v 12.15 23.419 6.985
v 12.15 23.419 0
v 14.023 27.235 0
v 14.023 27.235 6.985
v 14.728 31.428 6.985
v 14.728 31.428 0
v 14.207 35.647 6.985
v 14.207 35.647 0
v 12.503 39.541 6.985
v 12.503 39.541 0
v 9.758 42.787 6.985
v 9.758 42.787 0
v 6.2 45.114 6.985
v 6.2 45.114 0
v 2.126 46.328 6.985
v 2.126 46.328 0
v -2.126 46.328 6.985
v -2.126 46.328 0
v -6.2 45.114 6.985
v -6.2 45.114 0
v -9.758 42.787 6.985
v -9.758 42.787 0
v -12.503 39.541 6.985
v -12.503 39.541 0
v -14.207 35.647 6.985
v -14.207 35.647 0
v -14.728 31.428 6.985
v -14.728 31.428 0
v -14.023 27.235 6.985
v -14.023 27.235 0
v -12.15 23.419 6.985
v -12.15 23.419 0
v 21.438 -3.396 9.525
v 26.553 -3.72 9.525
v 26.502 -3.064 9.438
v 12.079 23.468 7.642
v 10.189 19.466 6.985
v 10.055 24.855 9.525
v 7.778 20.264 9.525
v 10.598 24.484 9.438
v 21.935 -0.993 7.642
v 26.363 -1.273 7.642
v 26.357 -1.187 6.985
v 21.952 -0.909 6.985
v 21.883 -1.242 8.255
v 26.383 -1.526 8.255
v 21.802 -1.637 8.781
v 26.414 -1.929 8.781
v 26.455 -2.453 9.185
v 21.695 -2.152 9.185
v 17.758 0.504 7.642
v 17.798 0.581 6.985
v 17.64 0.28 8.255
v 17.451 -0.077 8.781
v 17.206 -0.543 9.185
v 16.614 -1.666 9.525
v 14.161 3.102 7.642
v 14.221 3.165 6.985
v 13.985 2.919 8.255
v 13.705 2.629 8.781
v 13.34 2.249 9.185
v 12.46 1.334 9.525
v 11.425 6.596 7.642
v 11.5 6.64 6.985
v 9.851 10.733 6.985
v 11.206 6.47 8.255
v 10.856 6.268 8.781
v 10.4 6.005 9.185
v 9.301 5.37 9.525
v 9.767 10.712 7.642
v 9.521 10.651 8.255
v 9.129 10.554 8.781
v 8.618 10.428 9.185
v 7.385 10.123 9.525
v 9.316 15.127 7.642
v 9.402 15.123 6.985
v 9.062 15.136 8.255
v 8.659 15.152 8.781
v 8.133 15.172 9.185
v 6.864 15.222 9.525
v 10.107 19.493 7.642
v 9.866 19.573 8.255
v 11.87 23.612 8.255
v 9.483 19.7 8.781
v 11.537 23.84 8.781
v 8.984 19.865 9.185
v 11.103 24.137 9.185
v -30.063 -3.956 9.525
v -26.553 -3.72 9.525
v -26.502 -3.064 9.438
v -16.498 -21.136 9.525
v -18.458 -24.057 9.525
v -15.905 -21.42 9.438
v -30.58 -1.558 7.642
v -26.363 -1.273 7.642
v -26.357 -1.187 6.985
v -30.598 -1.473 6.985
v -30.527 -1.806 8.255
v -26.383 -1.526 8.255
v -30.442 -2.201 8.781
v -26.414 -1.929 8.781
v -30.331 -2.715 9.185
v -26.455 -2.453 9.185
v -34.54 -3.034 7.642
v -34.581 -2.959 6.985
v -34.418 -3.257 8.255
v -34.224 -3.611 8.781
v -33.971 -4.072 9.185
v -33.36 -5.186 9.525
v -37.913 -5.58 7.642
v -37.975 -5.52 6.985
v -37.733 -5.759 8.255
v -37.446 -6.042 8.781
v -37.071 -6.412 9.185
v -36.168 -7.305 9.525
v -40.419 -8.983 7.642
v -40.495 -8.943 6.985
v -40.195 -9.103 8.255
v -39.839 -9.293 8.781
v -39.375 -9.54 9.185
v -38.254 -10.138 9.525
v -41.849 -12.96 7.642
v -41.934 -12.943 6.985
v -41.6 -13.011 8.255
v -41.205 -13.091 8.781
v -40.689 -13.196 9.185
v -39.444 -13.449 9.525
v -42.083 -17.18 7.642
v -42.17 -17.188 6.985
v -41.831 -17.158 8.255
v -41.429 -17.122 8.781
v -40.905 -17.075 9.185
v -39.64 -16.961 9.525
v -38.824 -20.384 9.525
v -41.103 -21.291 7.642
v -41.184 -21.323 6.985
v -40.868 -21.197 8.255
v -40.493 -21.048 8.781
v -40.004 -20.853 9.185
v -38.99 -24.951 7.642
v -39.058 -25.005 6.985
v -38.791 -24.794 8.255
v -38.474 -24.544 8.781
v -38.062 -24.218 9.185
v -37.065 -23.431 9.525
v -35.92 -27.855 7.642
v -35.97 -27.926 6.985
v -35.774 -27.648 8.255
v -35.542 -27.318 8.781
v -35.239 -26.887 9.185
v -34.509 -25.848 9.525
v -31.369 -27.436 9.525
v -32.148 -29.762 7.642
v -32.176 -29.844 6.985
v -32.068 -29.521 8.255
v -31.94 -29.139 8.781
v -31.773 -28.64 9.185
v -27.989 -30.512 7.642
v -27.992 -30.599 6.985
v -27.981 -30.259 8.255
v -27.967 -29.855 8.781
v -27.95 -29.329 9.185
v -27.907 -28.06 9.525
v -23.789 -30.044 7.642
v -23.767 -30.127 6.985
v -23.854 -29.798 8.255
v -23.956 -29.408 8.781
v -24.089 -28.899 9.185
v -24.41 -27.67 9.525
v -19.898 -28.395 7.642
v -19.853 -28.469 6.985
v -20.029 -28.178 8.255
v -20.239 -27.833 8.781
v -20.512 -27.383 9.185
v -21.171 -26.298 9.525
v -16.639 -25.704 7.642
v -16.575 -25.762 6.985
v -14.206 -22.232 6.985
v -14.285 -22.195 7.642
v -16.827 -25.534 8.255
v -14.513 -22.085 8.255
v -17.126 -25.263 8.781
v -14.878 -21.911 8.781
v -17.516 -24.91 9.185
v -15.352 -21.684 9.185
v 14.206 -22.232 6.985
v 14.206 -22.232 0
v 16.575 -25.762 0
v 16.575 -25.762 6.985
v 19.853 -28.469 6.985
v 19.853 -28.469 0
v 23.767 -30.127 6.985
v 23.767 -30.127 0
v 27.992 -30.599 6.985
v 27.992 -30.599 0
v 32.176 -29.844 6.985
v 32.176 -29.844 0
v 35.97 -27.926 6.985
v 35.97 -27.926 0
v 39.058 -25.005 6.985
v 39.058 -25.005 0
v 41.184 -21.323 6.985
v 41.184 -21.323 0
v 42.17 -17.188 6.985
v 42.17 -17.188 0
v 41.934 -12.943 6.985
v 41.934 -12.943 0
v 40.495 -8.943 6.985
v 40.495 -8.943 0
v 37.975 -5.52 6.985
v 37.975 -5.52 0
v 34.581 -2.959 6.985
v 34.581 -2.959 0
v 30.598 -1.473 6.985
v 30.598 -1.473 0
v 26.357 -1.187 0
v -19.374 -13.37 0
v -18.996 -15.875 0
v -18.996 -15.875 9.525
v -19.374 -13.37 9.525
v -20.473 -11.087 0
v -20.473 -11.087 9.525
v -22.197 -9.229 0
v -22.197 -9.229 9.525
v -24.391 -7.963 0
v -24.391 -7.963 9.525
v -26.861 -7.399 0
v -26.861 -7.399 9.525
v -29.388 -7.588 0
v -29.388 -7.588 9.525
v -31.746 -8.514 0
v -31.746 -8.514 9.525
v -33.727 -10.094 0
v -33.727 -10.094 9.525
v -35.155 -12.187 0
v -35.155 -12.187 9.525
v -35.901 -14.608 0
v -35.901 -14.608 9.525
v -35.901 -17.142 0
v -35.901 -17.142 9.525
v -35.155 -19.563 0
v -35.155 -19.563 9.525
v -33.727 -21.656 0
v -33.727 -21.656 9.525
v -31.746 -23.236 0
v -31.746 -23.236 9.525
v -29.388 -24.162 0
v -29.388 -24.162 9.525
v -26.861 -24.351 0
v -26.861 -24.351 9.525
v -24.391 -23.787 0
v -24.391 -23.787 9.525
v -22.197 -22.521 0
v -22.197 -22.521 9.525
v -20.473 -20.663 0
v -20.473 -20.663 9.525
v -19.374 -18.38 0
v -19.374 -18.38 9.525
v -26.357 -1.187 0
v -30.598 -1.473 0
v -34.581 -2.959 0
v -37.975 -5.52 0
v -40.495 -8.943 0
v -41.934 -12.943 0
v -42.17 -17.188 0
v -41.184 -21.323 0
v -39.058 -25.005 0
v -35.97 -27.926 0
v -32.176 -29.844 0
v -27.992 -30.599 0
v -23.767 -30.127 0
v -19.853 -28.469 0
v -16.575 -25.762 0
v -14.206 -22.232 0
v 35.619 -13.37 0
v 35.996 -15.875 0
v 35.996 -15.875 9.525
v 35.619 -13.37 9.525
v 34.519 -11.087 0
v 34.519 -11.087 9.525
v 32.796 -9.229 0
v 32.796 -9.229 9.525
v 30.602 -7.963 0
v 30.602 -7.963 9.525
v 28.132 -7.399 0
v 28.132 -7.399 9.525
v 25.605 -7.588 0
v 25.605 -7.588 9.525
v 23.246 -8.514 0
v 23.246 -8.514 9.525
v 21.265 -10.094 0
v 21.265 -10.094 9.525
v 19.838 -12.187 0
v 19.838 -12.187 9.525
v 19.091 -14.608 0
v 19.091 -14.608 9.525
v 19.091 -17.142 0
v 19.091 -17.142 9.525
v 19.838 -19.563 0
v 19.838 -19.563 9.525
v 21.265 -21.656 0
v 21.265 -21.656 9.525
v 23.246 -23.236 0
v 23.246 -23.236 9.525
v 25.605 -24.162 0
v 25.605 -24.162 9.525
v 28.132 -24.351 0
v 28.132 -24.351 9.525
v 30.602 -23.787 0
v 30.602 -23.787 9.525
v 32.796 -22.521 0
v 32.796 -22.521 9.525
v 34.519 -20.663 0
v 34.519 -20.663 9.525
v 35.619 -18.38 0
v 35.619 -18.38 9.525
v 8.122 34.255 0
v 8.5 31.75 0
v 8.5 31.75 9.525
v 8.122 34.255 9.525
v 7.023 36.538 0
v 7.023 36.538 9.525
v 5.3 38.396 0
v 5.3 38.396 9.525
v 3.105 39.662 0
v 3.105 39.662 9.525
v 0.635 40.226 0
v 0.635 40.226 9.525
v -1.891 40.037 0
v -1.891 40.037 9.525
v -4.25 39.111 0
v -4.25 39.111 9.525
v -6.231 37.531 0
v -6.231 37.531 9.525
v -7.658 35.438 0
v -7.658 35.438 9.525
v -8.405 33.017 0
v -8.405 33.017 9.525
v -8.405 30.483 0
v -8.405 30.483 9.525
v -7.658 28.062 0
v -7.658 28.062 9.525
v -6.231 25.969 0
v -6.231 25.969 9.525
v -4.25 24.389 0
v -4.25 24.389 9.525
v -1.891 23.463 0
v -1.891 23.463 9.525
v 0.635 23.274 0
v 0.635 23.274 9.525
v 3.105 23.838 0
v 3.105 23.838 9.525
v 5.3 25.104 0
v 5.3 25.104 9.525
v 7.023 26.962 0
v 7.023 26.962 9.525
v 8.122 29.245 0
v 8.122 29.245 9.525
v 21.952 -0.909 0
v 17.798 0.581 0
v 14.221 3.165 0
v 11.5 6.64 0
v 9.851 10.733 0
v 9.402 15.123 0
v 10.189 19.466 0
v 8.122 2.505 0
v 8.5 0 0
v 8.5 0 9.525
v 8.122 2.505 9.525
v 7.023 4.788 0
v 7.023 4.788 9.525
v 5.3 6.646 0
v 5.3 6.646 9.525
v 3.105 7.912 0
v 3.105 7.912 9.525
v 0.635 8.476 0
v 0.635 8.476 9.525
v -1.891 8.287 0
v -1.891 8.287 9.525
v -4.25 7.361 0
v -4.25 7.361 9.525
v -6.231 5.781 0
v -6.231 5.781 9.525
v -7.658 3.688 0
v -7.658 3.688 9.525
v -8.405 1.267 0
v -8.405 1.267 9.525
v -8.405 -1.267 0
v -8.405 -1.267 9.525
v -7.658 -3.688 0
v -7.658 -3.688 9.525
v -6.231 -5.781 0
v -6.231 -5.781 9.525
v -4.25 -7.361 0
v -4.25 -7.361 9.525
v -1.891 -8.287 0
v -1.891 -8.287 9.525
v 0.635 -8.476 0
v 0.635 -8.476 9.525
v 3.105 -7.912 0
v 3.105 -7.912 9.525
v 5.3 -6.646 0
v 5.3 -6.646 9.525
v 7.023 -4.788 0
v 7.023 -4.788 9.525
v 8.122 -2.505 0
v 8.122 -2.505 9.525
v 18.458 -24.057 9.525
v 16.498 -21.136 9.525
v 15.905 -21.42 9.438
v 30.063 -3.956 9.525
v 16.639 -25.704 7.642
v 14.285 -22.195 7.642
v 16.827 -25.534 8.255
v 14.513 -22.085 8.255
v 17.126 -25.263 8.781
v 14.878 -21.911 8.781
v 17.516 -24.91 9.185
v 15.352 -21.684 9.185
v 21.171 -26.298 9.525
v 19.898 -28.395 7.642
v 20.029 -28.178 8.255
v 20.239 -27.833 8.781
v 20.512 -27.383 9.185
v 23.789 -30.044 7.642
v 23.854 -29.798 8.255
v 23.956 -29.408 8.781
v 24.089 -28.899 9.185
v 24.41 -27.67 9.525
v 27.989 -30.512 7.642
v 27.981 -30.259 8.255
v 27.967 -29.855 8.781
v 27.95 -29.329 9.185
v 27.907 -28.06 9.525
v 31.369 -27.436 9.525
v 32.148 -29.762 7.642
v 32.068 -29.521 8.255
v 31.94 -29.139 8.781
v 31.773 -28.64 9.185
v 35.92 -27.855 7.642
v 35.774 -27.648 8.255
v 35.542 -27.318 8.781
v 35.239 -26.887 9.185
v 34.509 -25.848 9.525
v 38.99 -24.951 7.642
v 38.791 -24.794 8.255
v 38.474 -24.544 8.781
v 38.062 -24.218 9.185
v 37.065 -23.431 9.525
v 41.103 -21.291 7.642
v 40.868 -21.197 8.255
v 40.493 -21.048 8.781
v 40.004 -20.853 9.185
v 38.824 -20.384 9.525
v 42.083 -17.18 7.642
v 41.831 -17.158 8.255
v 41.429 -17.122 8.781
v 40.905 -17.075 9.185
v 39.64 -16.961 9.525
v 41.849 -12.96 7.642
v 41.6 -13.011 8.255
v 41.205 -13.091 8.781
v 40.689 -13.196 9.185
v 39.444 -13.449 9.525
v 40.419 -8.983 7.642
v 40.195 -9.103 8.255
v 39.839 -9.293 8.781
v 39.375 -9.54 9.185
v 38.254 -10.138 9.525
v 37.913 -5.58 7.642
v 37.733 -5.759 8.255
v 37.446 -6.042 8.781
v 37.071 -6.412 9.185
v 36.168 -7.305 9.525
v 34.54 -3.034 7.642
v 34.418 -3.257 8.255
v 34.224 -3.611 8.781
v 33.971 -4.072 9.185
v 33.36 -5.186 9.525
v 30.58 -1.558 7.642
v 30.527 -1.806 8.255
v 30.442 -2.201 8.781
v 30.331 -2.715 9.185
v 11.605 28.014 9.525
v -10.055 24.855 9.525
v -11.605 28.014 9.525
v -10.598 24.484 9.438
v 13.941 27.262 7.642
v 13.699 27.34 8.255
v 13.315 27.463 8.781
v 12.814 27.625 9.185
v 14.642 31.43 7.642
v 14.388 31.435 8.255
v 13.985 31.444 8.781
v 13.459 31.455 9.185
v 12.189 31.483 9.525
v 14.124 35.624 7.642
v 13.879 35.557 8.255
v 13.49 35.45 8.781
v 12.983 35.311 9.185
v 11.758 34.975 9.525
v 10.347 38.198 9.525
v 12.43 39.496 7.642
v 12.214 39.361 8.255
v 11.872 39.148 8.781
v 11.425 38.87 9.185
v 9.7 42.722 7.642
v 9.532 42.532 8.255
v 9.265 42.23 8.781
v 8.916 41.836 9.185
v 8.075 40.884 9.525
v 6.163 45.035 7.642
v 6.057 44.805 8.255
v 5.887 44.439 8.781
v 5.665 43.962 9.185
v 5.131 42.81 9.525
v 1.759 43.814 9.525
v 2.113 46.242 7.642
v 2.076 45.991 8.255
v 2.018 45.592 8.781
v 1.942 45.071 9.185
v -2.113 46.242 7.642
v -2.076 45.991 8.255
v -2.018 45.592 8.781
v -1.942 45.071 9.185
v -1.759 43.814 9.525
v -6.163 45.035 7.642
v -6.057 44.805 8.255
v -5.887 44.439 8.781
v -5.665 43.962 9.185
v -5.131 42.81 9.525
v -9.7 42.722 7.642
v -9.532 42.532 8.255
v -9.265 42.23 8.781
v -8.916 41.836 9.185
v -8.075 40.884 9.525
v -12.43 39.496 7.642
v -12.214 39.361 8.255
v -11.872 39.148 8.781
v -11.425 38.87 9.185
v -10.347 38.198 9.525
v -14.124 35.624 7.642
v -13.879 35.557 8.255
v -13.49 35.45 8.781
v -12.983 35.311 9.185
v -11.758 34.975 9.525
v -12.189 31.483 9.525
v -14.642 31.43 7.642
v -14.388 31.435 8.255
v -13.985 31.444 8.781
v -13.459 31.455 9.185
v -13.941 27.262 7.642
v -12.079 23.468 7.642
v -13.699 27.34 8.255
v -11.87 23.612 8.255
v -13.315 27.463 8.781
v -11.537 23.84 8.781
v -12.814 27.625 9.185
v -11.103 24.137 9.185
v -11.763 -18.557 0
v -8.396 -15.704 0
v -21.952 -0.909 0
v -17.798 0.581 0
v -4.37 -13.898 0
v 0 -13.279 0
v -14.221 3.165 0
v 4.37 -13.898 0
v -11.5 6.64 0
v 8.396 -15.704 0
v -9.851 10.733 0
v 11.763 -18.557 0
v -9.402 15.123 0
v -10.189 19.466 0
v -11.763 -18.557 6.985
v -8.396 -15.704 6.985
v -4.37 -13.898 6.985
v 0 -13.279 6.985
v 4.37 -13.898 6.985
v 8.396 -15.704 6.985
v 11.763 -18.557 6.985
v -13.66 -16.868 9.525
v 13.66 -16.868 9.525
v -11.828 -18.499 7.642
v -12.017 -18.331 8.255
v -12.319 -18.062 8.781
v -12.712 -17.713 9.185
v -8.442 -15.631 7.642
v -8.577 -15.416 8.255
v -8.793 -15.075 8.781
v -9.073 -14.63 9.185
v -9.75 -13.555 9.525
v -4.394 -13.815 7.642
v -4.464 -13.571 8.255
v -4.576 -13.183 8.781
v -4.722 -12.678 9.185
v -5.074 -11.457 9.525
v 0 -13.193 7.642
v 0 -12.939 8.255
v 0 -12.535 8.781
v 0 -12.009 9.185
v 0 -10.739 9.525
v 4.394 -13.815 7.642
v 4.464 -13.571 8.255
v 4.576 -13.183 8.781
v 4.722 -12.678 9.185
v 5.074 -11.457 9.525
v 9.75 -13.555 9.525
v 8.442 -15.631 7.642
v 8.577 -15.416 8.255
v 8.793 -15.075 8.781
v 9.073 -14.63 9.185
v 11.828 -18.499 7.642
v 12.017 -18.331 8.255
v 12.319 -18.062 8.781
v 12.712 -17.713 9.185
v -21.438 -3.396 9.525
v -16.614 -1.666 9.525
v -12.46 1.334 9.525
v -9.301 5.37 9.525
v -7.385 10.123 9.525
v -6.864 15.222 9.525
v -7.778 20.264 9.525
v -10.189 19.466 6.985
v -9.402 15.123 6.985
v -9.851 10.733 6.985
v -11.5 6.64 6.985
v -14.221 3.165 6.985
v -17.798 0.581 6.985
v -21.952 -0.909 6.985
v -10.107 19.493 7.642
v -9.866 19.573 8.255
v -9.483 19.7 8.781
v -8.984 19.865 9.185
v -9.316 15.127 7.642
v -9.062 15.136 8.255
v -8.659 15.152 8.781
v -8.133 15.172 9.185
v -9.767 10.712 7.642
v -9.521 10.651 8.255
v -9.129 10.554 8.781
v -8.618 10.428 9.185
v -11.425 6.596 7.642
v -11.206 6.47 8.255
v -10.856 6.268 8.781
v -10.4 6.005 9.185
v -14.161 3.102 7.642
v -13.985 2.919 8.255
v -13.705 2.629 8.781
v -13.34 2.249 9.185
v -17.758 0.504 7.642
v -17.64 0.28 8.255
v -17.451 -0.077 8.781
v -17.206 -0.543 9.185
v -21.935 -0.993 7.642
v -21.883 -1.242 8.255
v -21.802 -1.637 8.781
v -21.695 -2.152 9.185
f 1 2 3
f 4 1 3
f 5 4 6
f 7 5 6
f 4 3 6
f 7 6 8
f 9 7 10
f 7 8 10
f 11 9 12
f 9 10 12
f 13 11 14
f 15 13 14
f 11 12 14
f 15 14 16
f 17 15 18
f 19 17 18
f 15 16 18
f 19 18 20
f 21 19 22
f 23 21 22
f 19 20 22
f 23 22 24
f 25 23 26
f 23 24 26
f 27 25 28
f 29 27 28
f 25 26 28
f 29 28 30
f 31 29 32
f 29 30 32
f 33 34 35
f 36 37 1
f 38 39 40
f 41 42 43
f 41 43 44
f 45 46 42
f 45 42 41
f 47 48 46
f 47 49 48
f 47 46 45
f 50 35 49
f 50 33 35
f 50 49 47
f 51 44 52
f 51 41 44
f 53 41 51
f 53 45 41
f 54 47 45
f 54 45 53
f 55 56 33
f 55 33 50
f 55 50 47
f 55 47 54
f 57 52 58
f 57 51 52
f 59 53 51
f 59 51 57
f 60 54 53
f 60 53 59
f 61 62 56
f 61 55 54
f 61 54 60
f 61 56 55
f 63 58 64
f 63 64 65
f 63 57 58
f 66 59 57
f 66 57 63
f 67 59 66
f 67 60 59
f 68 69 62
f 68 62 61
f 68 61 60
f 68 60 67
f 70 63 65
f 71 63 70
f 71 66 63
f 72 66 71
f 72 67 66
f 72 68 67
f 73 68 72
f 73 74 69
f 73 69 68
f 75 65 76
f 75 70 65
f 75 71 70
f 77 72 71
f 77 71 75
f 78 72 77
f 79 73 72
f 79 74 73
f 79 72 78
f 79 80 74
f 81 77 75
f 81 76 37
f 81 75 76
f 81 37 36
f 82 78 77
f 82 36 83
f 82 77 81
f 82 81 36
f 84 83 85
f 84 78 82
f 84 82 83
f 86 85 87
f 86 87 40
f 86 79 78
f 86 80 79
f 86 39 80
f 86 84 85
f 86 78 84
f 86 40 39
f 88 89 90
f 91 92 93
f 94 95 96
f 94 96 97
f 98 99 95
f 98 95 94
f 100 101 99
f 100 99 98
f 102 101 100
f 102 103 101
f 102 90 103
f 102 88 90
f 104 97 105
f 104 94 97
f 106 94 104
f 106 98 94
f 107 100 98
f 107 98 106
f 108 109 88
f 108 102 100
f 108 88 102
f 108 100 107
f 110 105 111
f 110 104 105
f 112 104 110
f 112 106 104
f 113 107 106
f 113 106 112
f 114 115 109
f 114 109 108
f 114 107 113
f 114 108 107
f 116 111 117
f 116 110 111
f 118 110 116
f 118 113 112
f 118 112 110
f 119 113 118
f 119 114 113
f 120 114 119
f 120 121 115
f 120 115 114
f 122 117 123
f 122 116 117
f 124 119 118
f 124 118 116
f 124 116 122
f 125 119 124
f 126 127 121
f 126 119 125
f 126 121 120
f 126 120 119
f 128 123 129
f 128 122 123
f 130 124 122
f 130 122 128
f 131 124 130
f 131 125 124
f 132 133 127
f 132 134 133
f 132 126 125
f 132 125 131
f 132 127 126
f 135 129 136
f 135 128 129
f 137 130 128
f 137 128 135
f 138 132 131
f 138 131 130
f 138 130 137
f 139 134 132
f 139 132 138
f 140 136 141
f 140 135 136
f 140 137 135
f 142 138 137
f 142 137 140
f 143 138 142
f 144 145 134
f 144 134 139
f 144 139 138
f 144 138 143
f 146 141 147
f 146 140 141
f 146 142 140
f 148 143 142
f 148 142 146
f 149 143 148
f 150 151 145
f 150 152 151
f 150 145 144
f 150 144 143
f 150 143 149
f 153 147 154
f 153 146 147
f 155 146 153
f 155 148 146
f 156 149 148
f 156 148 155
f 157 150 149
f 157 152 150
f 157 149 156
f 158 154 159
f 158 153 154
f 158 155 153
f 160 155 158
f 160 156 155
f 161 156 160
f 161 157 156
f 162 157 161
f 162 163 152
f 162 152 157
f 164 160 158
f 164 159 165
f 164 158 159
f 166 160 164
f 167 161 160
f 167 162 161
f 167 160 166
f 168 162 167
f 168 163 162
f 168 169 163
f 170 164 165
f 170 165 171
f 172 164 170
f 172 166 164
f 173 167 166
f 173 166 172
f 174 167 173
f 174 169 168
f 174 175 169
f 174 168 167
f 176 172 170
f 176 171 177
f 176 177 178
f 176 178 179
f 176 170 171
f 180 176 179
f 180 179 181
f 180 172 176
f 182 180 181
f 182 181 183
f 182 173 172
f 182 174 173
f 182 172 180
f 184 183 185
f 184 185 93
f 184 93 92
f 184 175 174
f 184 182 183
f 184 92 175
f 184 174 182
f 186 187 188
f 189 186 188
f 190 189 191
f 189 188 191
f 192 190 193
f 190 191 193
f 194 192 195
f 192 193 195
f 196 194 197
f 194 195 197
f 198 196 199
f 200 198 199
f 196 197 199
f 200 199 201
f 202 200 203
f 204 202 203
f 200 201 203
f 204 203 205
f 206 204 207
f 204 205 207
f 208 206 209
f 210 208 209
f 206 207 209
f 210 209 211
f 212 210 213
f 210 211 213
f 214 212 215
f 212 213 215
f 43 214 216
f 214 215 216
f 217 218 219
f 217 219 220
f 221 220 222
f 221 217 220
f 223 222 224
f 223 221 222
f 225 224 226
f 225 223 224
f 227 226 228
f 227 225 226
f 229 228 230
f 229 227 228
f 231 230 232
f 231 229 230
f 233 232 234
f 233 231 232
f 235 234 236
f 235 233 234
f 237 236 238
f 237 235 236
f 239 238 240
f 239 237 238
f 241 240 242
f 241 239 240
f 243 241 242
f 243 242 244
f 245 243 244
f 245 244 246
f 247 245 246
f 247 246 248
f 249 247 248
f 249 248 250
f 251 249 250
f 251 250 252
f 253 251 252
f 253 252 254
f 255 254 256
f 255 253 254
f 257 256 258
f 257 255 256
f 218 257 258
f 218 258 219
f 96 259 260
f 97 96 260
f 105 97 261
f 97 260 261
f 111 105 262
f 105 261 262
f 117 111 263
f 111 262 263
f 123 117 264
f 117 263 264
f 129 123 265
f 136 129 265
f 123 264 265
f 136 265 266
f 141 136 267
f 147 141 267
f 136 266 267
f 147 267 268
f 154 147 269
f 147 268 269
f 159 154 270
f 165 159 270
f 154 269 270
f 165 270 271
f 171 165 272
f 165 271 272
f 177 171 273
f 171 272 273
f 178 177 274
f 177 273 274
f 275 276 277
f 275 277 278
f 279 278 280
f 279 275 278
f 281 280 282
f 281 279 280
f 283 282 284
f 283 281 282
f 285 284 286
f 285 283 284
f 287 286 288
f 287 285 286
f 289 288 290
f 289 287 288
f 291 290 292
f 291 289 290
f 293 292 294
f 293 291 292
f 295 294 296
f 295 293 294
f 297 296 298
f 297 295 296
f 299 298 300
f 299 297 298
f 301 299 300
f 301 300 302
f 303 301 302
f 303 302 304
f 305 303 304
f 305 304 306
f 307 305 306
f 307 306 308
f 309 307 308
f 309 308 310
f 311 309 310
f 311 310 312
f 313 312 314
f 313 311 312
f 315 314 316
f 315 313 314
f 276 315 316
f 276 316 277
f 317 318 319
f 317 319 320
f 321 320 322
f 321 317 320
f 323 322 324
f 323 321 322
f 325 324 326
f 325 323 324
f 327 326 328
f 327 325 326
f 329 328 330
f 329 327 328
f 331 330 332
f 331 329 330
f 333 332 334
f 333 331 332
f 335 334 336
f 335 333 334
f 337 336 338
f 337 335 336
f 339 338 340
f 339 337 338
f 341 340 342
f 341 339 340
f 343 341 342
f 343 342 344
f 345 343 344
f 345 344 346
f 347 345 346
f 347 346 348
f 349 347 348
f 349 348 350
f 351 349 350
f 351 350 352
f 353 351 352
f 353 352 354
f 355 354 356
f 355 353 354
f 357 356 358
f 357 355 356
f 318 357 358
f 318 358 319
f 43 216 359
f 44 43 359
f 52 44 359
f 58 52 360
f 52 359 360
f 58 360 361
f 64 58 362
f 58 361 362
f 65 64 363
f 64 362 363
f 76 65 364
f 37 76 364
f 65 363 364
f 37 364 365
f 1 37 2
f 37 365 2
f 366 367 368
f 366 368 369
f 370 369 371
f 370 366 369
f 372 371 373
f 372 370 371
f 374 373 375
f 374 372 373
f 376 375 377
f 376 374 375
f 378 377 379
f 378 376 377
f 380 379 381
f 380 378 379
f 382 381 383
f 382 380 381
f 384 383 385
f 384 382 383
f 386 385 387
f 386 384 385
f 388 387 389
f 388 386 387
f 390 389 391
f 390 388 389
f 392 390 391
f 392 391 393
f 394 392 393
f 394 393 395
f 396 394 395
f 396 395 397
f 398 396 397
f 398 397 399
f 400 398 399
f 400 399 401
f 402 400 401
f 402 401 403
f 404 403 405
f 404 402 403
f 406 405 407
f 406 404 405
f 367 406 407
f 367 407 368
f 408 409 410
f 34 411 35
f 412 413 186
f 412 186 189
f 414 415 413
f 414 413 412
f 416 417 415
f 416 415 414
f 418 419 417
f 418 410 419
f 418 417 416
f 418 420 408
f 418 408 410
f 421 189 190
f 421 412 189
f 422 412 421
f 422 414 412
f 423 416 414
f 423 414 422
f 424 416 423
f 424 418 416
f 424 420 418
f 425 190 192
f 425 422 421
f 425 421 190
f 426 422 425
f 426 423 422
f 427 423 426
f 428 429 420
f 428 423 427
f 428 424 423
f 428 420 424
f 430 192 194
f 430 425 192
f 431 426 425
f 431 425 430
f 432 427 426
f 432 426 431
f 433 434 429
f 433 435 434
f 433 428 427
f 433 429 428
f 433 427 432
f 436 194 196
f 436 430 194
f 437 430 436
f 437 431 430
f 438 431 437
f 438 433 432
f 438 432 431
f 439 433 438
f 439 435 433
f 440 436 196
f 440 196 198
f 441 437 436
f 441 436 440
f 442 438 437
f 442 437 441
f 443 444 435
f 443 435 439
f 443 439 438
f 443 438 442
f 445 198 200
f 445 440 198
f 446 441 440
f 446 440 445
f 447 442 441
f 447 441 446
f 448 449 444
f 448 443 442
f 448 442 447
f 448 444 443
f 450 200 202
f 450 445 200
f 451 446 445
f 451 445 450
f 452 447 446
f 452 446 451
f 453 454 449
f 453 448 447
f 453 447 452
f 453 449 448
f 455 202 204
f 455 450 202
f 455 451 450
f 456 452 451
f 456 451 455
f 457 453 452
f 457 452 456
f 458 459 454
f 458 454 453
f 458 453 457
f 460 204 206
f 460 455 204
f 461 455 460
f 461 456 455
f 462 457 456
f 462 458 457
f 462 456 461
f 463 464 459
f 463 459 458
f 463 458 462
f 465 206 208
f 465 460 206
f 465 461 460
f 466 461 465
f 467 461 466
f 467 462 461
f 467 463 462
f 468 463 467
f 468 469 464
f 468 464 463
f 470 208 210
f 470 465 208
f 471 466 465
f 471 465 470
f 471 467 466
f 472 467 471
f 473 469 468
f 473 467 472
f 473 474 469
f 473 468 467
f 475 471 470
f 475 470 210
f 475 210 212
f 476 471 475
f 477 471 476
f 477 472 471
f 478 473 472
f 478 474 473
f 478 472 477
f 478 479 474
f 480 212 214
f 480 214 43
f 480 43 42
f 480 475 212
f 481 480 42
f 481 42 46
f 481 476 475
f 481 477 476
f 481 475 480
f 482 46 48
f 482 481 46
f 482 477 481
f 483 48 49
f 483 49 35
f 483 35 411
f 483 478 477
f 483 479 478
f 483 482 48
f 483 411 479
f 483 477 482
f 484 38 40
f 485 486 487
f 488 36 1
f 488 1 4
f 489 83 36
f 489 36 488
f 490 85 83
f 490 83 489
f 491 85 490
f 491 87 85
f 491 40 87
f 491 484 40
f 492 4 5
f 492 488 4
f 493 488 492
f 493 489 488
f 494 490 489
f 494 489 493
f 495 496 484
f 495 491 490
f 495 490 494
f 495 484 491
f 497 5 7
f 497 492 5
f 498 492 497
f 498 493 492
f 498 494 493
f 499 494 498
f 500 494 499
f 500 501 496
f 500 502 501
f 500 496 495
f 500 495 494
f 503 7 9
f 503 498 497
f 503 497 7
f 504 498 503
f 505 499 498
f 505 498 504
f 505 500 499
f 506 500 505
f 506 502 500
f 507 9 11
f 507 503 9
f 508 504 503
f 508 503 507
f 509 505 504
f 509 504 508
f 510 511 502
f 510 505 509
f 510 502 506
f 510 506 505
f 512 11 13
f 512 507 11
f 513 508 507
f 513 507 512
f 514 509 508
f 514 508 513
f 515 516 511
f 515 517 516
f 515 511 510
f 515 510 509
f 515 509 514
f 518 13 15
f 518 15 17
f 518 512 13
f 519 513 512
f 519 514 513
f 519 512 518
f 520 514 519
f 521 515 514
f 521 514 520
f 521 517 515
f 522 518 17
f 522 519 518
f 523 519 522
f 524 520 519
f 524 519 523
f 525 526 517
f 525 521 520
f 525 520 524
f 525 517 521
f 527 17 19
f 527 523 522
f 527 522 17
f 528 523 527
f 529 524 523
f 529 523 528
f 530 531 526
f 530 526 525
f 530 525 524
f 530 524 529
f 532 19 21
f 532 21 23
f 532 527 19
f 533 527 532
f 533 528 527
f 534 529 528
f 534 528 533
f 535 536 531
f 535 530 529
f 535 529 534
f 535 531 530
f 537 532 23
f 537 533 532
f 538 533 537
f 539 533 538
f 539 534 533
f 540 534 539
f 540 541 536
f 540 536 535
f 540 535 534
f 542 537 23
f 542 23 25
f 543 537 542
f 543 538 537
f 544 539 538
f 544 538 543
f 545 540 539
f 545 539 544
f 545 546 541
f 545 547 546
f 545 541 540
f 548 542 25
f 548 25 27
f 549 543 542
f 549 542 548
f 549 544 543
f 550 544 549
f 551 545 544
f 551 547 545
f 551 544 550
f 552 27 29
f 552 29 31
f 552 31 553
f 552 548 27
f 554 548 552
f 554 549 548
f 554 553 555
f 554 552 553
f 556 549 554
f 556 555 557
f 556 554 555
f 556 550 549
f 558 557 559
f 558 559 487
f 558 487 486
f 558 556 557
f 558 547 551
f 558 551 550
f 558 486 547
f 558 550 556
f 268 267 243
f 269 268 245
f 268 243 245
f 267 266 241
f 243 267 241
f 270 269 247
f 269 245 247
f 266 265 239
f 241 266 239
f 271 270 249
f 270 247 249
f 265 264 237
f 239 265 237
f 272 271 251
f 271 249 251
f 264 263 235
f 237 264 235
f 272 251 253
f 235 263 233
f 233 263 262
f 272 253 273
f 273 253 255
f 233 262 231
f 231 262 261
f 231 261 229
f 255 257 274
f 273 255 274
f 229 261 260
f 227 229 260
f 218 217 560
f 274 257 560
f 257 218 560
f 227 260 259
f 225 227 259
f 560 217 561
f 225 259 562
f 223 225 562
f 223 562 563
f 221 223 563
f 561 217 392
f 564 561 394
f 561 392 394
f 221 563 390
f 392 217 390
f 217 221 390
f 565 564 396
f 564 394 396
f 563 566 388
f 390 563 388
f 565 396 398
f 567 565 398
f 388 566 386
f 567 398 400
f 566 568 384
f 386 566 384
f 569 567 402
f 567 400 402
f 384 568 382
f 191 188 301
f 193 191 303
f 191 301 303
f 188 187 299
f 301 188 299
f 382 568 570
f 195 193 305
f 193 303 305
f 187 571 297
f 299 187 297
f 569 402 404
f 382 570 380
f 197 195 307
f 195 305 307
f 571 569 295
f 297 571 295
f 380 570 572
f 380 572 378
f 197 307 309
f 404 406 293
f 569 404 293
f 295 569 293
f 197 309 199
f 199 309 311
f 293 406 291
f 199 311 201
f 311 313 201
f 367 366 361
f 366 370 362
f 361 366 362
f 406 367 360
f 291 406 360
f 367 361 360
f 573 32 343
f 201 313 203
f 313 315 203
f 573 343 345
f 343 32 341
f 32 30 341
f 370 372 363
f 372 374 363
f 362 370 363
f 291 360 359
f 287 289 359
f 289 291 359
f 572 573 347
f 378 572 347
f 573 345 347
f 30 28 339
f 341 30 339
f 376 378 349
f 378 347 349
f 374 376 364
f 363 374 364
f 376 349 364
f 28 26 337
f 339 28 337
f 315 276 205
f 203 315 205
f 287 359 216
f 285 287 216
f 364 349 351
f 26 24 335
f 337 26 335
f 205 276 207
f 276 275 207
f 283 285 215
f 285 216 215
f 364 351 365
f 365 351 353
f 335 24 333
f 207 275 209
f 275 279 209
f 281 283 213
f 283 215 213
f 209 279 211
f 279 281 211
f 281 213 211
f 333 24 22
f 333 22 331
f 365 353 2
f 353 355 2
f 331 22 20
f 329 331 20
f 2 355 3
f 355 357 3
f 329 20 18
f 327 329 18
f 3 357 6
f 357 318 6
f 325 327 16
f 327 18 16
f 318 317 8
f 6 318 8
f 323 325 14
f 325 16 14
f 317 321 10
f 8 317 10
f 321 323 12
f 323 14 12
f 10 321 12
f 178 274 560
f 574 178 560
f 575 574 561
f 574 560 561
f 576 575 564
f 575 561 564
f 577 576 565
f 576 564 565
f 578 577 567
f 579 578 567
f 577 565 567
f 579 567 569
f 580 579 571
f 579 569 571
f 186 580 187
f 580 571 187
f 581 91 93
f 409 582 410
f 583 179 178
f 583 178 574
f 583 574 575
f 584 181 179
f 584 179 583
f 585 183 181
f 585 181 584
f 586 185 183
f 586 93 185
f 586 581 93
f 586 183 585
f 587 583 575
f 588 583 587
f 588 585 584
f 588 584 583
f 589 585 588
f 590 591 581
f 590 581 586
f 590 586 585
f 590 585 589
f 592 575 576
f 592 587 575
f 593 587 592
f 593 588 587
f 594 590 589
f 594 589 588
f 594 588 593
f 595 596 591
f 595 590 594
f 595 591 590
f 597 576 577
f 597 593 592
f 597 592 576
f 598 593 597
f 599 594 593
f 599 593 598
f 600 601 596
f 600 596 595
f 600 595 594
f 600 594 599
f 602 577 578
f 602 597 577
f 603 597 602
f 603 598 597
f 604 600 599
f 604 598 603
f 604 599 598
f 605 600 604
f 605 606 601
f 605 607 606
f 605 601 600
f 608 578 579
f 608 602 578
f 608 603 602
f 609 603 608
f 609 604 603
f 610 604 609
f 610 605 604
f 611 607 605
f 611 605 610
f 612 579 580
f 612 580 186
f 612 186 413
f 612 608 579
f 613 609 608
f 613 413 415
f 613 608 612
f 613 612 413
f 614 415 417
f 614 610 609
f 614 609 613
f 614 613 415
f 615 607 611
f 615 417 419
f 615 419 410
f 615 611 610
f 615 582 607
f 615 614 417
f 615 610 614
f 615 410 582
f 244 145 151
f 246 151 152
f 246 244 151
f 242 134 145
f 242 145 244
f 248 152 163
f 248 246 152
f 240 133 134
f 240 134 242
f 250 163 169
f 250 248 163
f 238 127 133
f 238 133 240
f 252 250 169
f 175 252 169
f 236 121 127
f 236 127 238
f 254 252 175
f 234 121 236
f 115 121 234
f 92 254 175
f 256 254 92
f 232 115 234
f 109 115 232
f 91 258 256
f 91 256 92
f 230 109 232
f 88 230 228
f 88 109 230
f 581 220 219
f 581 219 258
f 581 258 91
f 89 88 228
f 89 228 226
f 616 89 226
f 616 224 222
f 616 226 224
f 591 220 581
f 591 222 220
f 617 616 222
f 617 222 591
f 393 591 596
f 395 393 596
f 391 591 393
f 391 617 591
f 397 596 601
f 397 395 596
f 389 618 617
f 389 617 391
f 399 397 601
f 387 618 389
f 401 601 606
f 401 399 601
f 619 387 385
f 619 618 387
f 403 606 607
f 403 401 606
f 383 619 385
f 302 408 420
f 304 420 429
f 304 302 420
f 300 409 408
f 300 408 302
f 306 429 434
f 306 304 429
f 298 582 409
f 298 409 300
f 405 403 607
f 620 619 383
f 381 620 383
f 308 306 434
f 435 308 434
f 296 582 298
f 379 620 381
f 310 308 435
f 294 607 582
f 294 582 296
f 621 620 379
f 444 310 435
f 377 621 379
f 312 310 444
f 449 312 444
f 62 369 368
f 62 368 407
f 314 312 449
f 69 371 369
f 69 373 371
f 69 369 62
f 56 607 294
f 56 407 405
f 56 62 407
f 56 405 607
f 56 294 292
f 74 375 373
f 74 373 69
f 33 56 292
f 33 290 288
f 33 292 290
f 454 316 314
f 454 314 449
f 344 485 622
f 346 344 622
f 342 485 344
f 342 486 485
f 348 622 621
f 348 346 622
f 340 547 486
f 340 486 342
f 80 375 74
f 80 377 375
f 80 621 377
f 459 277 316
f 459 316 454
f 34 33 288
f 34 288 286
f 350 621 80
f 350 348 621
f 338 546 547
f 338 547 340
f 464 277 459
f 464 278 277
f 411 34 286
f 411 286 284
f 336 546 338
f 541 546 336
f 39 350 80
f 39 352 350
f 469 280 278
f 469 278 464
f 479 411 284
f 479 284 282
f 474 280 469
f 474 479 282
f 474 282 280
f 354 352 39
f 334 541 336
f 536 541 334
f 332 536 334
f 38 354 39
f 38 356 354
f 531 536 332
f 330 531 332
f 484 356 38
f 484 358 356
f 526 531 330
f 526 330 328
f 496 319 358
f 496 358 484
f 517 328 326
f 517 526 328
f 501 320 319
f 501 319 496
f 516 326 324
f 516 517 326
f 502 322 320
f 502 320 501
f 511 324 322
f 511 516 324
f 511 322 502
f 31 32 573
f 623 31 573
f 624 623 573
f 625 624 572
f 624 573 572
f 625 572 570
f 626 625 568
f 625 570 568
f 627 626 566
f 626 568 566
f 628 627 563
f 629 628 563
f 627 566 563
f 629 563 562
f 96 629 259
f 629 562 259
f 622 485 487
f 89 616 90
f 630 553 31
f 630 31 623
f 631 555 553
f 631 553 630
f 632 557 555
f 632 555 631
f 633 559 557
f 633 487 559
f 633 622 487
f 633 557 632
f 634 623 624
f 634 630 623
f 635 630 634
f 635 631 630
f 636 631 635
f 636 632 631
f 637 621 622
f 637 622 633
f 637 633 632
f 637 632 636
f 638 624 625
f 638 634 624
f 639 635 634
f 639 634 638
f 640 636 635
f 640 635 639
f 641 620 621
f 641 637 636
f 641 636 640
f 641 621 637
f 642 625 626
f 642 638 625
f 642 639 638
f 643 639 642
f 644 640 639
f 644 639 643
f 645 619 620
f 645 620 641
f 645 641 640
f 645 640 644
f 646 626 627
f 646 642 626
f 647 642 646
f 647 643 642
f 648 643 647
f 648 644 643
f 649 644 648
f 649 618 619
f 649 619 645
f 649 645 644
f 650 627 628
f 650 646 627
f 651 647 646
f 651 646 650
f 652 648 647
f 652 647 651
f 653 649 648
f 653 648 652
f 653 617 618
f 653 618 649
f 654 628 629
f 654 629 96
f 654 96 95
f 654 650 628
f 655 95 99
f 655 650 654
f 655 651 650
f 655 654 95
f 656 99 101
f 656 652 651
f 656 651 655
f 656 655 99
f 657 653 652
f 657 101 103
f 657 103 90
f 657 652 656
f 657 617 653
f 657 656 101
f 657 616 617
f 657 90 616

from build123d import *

# Parameters (mm, degrees)
F0_R     = 8.5
F1_DEPTH = 9.525
F2_R     = 2.54


# Not quite as in the source:
# - a feature names something its author has since deleted; it is built from what else it names


with BuildPart() as f1:
    # F0 (on Top) → F1 (new body)
    with BuildSketch(Plane.XY):
        with BuildLine():
            ThreePointArc((-12.1502250441, 23.4191023666), (-11.5002285841, 6.6396600688), (-26.3566501053, -1.1871476334))
            ThreePointArc((-26.3566501053, -1.1871476334), (-40.2545928187, -23.241), (-14.2064250612, -22.2319547331))
            ThreePointArc((-14.2064250612, -22.2319547331), (0, -13.2793201375), (14.2064250612, -22.2319547331))
            ThreePointArc((14.2064250612, -22.2319547331), (40.2545928187, -23.241), (26.3566501053, -1.1871476334))
            ThreePointArc((26.3566501053, -1.1871476334), (11.5002285841, 6.6396600688), (12.1502250441, 23.4191023666))
            ThreePointArc((12.1502250441, 23.4191023666), (0, 46.482), (-12.1502250441, 23.4191023666))
        make_face()
        with Locations((-27.4963065702, -15.875)):
            Circle(F0_R, mode=Mode.SUBTRACT)
        with Locations((27.4963065702, -15.875)):
            Circle(F0_R, mode=Mode.SUBTRACT)
        Circle(F0_R, mode=Mode.SUBTRACT)
        with Locations((0, 31.75)):
            Circle(F0_R, mode=Mode.SUBTRACT)
    extrude(amount=F1_DEPTH)

    # F2
    f2_edges = [f1.edges().sort_by_distance(p)[0] for p in [
        (-11.500229, 6.63966, 9.525),
    ]]
    fillet(f2_edges, radius=F2_R)


solid = f1.part
